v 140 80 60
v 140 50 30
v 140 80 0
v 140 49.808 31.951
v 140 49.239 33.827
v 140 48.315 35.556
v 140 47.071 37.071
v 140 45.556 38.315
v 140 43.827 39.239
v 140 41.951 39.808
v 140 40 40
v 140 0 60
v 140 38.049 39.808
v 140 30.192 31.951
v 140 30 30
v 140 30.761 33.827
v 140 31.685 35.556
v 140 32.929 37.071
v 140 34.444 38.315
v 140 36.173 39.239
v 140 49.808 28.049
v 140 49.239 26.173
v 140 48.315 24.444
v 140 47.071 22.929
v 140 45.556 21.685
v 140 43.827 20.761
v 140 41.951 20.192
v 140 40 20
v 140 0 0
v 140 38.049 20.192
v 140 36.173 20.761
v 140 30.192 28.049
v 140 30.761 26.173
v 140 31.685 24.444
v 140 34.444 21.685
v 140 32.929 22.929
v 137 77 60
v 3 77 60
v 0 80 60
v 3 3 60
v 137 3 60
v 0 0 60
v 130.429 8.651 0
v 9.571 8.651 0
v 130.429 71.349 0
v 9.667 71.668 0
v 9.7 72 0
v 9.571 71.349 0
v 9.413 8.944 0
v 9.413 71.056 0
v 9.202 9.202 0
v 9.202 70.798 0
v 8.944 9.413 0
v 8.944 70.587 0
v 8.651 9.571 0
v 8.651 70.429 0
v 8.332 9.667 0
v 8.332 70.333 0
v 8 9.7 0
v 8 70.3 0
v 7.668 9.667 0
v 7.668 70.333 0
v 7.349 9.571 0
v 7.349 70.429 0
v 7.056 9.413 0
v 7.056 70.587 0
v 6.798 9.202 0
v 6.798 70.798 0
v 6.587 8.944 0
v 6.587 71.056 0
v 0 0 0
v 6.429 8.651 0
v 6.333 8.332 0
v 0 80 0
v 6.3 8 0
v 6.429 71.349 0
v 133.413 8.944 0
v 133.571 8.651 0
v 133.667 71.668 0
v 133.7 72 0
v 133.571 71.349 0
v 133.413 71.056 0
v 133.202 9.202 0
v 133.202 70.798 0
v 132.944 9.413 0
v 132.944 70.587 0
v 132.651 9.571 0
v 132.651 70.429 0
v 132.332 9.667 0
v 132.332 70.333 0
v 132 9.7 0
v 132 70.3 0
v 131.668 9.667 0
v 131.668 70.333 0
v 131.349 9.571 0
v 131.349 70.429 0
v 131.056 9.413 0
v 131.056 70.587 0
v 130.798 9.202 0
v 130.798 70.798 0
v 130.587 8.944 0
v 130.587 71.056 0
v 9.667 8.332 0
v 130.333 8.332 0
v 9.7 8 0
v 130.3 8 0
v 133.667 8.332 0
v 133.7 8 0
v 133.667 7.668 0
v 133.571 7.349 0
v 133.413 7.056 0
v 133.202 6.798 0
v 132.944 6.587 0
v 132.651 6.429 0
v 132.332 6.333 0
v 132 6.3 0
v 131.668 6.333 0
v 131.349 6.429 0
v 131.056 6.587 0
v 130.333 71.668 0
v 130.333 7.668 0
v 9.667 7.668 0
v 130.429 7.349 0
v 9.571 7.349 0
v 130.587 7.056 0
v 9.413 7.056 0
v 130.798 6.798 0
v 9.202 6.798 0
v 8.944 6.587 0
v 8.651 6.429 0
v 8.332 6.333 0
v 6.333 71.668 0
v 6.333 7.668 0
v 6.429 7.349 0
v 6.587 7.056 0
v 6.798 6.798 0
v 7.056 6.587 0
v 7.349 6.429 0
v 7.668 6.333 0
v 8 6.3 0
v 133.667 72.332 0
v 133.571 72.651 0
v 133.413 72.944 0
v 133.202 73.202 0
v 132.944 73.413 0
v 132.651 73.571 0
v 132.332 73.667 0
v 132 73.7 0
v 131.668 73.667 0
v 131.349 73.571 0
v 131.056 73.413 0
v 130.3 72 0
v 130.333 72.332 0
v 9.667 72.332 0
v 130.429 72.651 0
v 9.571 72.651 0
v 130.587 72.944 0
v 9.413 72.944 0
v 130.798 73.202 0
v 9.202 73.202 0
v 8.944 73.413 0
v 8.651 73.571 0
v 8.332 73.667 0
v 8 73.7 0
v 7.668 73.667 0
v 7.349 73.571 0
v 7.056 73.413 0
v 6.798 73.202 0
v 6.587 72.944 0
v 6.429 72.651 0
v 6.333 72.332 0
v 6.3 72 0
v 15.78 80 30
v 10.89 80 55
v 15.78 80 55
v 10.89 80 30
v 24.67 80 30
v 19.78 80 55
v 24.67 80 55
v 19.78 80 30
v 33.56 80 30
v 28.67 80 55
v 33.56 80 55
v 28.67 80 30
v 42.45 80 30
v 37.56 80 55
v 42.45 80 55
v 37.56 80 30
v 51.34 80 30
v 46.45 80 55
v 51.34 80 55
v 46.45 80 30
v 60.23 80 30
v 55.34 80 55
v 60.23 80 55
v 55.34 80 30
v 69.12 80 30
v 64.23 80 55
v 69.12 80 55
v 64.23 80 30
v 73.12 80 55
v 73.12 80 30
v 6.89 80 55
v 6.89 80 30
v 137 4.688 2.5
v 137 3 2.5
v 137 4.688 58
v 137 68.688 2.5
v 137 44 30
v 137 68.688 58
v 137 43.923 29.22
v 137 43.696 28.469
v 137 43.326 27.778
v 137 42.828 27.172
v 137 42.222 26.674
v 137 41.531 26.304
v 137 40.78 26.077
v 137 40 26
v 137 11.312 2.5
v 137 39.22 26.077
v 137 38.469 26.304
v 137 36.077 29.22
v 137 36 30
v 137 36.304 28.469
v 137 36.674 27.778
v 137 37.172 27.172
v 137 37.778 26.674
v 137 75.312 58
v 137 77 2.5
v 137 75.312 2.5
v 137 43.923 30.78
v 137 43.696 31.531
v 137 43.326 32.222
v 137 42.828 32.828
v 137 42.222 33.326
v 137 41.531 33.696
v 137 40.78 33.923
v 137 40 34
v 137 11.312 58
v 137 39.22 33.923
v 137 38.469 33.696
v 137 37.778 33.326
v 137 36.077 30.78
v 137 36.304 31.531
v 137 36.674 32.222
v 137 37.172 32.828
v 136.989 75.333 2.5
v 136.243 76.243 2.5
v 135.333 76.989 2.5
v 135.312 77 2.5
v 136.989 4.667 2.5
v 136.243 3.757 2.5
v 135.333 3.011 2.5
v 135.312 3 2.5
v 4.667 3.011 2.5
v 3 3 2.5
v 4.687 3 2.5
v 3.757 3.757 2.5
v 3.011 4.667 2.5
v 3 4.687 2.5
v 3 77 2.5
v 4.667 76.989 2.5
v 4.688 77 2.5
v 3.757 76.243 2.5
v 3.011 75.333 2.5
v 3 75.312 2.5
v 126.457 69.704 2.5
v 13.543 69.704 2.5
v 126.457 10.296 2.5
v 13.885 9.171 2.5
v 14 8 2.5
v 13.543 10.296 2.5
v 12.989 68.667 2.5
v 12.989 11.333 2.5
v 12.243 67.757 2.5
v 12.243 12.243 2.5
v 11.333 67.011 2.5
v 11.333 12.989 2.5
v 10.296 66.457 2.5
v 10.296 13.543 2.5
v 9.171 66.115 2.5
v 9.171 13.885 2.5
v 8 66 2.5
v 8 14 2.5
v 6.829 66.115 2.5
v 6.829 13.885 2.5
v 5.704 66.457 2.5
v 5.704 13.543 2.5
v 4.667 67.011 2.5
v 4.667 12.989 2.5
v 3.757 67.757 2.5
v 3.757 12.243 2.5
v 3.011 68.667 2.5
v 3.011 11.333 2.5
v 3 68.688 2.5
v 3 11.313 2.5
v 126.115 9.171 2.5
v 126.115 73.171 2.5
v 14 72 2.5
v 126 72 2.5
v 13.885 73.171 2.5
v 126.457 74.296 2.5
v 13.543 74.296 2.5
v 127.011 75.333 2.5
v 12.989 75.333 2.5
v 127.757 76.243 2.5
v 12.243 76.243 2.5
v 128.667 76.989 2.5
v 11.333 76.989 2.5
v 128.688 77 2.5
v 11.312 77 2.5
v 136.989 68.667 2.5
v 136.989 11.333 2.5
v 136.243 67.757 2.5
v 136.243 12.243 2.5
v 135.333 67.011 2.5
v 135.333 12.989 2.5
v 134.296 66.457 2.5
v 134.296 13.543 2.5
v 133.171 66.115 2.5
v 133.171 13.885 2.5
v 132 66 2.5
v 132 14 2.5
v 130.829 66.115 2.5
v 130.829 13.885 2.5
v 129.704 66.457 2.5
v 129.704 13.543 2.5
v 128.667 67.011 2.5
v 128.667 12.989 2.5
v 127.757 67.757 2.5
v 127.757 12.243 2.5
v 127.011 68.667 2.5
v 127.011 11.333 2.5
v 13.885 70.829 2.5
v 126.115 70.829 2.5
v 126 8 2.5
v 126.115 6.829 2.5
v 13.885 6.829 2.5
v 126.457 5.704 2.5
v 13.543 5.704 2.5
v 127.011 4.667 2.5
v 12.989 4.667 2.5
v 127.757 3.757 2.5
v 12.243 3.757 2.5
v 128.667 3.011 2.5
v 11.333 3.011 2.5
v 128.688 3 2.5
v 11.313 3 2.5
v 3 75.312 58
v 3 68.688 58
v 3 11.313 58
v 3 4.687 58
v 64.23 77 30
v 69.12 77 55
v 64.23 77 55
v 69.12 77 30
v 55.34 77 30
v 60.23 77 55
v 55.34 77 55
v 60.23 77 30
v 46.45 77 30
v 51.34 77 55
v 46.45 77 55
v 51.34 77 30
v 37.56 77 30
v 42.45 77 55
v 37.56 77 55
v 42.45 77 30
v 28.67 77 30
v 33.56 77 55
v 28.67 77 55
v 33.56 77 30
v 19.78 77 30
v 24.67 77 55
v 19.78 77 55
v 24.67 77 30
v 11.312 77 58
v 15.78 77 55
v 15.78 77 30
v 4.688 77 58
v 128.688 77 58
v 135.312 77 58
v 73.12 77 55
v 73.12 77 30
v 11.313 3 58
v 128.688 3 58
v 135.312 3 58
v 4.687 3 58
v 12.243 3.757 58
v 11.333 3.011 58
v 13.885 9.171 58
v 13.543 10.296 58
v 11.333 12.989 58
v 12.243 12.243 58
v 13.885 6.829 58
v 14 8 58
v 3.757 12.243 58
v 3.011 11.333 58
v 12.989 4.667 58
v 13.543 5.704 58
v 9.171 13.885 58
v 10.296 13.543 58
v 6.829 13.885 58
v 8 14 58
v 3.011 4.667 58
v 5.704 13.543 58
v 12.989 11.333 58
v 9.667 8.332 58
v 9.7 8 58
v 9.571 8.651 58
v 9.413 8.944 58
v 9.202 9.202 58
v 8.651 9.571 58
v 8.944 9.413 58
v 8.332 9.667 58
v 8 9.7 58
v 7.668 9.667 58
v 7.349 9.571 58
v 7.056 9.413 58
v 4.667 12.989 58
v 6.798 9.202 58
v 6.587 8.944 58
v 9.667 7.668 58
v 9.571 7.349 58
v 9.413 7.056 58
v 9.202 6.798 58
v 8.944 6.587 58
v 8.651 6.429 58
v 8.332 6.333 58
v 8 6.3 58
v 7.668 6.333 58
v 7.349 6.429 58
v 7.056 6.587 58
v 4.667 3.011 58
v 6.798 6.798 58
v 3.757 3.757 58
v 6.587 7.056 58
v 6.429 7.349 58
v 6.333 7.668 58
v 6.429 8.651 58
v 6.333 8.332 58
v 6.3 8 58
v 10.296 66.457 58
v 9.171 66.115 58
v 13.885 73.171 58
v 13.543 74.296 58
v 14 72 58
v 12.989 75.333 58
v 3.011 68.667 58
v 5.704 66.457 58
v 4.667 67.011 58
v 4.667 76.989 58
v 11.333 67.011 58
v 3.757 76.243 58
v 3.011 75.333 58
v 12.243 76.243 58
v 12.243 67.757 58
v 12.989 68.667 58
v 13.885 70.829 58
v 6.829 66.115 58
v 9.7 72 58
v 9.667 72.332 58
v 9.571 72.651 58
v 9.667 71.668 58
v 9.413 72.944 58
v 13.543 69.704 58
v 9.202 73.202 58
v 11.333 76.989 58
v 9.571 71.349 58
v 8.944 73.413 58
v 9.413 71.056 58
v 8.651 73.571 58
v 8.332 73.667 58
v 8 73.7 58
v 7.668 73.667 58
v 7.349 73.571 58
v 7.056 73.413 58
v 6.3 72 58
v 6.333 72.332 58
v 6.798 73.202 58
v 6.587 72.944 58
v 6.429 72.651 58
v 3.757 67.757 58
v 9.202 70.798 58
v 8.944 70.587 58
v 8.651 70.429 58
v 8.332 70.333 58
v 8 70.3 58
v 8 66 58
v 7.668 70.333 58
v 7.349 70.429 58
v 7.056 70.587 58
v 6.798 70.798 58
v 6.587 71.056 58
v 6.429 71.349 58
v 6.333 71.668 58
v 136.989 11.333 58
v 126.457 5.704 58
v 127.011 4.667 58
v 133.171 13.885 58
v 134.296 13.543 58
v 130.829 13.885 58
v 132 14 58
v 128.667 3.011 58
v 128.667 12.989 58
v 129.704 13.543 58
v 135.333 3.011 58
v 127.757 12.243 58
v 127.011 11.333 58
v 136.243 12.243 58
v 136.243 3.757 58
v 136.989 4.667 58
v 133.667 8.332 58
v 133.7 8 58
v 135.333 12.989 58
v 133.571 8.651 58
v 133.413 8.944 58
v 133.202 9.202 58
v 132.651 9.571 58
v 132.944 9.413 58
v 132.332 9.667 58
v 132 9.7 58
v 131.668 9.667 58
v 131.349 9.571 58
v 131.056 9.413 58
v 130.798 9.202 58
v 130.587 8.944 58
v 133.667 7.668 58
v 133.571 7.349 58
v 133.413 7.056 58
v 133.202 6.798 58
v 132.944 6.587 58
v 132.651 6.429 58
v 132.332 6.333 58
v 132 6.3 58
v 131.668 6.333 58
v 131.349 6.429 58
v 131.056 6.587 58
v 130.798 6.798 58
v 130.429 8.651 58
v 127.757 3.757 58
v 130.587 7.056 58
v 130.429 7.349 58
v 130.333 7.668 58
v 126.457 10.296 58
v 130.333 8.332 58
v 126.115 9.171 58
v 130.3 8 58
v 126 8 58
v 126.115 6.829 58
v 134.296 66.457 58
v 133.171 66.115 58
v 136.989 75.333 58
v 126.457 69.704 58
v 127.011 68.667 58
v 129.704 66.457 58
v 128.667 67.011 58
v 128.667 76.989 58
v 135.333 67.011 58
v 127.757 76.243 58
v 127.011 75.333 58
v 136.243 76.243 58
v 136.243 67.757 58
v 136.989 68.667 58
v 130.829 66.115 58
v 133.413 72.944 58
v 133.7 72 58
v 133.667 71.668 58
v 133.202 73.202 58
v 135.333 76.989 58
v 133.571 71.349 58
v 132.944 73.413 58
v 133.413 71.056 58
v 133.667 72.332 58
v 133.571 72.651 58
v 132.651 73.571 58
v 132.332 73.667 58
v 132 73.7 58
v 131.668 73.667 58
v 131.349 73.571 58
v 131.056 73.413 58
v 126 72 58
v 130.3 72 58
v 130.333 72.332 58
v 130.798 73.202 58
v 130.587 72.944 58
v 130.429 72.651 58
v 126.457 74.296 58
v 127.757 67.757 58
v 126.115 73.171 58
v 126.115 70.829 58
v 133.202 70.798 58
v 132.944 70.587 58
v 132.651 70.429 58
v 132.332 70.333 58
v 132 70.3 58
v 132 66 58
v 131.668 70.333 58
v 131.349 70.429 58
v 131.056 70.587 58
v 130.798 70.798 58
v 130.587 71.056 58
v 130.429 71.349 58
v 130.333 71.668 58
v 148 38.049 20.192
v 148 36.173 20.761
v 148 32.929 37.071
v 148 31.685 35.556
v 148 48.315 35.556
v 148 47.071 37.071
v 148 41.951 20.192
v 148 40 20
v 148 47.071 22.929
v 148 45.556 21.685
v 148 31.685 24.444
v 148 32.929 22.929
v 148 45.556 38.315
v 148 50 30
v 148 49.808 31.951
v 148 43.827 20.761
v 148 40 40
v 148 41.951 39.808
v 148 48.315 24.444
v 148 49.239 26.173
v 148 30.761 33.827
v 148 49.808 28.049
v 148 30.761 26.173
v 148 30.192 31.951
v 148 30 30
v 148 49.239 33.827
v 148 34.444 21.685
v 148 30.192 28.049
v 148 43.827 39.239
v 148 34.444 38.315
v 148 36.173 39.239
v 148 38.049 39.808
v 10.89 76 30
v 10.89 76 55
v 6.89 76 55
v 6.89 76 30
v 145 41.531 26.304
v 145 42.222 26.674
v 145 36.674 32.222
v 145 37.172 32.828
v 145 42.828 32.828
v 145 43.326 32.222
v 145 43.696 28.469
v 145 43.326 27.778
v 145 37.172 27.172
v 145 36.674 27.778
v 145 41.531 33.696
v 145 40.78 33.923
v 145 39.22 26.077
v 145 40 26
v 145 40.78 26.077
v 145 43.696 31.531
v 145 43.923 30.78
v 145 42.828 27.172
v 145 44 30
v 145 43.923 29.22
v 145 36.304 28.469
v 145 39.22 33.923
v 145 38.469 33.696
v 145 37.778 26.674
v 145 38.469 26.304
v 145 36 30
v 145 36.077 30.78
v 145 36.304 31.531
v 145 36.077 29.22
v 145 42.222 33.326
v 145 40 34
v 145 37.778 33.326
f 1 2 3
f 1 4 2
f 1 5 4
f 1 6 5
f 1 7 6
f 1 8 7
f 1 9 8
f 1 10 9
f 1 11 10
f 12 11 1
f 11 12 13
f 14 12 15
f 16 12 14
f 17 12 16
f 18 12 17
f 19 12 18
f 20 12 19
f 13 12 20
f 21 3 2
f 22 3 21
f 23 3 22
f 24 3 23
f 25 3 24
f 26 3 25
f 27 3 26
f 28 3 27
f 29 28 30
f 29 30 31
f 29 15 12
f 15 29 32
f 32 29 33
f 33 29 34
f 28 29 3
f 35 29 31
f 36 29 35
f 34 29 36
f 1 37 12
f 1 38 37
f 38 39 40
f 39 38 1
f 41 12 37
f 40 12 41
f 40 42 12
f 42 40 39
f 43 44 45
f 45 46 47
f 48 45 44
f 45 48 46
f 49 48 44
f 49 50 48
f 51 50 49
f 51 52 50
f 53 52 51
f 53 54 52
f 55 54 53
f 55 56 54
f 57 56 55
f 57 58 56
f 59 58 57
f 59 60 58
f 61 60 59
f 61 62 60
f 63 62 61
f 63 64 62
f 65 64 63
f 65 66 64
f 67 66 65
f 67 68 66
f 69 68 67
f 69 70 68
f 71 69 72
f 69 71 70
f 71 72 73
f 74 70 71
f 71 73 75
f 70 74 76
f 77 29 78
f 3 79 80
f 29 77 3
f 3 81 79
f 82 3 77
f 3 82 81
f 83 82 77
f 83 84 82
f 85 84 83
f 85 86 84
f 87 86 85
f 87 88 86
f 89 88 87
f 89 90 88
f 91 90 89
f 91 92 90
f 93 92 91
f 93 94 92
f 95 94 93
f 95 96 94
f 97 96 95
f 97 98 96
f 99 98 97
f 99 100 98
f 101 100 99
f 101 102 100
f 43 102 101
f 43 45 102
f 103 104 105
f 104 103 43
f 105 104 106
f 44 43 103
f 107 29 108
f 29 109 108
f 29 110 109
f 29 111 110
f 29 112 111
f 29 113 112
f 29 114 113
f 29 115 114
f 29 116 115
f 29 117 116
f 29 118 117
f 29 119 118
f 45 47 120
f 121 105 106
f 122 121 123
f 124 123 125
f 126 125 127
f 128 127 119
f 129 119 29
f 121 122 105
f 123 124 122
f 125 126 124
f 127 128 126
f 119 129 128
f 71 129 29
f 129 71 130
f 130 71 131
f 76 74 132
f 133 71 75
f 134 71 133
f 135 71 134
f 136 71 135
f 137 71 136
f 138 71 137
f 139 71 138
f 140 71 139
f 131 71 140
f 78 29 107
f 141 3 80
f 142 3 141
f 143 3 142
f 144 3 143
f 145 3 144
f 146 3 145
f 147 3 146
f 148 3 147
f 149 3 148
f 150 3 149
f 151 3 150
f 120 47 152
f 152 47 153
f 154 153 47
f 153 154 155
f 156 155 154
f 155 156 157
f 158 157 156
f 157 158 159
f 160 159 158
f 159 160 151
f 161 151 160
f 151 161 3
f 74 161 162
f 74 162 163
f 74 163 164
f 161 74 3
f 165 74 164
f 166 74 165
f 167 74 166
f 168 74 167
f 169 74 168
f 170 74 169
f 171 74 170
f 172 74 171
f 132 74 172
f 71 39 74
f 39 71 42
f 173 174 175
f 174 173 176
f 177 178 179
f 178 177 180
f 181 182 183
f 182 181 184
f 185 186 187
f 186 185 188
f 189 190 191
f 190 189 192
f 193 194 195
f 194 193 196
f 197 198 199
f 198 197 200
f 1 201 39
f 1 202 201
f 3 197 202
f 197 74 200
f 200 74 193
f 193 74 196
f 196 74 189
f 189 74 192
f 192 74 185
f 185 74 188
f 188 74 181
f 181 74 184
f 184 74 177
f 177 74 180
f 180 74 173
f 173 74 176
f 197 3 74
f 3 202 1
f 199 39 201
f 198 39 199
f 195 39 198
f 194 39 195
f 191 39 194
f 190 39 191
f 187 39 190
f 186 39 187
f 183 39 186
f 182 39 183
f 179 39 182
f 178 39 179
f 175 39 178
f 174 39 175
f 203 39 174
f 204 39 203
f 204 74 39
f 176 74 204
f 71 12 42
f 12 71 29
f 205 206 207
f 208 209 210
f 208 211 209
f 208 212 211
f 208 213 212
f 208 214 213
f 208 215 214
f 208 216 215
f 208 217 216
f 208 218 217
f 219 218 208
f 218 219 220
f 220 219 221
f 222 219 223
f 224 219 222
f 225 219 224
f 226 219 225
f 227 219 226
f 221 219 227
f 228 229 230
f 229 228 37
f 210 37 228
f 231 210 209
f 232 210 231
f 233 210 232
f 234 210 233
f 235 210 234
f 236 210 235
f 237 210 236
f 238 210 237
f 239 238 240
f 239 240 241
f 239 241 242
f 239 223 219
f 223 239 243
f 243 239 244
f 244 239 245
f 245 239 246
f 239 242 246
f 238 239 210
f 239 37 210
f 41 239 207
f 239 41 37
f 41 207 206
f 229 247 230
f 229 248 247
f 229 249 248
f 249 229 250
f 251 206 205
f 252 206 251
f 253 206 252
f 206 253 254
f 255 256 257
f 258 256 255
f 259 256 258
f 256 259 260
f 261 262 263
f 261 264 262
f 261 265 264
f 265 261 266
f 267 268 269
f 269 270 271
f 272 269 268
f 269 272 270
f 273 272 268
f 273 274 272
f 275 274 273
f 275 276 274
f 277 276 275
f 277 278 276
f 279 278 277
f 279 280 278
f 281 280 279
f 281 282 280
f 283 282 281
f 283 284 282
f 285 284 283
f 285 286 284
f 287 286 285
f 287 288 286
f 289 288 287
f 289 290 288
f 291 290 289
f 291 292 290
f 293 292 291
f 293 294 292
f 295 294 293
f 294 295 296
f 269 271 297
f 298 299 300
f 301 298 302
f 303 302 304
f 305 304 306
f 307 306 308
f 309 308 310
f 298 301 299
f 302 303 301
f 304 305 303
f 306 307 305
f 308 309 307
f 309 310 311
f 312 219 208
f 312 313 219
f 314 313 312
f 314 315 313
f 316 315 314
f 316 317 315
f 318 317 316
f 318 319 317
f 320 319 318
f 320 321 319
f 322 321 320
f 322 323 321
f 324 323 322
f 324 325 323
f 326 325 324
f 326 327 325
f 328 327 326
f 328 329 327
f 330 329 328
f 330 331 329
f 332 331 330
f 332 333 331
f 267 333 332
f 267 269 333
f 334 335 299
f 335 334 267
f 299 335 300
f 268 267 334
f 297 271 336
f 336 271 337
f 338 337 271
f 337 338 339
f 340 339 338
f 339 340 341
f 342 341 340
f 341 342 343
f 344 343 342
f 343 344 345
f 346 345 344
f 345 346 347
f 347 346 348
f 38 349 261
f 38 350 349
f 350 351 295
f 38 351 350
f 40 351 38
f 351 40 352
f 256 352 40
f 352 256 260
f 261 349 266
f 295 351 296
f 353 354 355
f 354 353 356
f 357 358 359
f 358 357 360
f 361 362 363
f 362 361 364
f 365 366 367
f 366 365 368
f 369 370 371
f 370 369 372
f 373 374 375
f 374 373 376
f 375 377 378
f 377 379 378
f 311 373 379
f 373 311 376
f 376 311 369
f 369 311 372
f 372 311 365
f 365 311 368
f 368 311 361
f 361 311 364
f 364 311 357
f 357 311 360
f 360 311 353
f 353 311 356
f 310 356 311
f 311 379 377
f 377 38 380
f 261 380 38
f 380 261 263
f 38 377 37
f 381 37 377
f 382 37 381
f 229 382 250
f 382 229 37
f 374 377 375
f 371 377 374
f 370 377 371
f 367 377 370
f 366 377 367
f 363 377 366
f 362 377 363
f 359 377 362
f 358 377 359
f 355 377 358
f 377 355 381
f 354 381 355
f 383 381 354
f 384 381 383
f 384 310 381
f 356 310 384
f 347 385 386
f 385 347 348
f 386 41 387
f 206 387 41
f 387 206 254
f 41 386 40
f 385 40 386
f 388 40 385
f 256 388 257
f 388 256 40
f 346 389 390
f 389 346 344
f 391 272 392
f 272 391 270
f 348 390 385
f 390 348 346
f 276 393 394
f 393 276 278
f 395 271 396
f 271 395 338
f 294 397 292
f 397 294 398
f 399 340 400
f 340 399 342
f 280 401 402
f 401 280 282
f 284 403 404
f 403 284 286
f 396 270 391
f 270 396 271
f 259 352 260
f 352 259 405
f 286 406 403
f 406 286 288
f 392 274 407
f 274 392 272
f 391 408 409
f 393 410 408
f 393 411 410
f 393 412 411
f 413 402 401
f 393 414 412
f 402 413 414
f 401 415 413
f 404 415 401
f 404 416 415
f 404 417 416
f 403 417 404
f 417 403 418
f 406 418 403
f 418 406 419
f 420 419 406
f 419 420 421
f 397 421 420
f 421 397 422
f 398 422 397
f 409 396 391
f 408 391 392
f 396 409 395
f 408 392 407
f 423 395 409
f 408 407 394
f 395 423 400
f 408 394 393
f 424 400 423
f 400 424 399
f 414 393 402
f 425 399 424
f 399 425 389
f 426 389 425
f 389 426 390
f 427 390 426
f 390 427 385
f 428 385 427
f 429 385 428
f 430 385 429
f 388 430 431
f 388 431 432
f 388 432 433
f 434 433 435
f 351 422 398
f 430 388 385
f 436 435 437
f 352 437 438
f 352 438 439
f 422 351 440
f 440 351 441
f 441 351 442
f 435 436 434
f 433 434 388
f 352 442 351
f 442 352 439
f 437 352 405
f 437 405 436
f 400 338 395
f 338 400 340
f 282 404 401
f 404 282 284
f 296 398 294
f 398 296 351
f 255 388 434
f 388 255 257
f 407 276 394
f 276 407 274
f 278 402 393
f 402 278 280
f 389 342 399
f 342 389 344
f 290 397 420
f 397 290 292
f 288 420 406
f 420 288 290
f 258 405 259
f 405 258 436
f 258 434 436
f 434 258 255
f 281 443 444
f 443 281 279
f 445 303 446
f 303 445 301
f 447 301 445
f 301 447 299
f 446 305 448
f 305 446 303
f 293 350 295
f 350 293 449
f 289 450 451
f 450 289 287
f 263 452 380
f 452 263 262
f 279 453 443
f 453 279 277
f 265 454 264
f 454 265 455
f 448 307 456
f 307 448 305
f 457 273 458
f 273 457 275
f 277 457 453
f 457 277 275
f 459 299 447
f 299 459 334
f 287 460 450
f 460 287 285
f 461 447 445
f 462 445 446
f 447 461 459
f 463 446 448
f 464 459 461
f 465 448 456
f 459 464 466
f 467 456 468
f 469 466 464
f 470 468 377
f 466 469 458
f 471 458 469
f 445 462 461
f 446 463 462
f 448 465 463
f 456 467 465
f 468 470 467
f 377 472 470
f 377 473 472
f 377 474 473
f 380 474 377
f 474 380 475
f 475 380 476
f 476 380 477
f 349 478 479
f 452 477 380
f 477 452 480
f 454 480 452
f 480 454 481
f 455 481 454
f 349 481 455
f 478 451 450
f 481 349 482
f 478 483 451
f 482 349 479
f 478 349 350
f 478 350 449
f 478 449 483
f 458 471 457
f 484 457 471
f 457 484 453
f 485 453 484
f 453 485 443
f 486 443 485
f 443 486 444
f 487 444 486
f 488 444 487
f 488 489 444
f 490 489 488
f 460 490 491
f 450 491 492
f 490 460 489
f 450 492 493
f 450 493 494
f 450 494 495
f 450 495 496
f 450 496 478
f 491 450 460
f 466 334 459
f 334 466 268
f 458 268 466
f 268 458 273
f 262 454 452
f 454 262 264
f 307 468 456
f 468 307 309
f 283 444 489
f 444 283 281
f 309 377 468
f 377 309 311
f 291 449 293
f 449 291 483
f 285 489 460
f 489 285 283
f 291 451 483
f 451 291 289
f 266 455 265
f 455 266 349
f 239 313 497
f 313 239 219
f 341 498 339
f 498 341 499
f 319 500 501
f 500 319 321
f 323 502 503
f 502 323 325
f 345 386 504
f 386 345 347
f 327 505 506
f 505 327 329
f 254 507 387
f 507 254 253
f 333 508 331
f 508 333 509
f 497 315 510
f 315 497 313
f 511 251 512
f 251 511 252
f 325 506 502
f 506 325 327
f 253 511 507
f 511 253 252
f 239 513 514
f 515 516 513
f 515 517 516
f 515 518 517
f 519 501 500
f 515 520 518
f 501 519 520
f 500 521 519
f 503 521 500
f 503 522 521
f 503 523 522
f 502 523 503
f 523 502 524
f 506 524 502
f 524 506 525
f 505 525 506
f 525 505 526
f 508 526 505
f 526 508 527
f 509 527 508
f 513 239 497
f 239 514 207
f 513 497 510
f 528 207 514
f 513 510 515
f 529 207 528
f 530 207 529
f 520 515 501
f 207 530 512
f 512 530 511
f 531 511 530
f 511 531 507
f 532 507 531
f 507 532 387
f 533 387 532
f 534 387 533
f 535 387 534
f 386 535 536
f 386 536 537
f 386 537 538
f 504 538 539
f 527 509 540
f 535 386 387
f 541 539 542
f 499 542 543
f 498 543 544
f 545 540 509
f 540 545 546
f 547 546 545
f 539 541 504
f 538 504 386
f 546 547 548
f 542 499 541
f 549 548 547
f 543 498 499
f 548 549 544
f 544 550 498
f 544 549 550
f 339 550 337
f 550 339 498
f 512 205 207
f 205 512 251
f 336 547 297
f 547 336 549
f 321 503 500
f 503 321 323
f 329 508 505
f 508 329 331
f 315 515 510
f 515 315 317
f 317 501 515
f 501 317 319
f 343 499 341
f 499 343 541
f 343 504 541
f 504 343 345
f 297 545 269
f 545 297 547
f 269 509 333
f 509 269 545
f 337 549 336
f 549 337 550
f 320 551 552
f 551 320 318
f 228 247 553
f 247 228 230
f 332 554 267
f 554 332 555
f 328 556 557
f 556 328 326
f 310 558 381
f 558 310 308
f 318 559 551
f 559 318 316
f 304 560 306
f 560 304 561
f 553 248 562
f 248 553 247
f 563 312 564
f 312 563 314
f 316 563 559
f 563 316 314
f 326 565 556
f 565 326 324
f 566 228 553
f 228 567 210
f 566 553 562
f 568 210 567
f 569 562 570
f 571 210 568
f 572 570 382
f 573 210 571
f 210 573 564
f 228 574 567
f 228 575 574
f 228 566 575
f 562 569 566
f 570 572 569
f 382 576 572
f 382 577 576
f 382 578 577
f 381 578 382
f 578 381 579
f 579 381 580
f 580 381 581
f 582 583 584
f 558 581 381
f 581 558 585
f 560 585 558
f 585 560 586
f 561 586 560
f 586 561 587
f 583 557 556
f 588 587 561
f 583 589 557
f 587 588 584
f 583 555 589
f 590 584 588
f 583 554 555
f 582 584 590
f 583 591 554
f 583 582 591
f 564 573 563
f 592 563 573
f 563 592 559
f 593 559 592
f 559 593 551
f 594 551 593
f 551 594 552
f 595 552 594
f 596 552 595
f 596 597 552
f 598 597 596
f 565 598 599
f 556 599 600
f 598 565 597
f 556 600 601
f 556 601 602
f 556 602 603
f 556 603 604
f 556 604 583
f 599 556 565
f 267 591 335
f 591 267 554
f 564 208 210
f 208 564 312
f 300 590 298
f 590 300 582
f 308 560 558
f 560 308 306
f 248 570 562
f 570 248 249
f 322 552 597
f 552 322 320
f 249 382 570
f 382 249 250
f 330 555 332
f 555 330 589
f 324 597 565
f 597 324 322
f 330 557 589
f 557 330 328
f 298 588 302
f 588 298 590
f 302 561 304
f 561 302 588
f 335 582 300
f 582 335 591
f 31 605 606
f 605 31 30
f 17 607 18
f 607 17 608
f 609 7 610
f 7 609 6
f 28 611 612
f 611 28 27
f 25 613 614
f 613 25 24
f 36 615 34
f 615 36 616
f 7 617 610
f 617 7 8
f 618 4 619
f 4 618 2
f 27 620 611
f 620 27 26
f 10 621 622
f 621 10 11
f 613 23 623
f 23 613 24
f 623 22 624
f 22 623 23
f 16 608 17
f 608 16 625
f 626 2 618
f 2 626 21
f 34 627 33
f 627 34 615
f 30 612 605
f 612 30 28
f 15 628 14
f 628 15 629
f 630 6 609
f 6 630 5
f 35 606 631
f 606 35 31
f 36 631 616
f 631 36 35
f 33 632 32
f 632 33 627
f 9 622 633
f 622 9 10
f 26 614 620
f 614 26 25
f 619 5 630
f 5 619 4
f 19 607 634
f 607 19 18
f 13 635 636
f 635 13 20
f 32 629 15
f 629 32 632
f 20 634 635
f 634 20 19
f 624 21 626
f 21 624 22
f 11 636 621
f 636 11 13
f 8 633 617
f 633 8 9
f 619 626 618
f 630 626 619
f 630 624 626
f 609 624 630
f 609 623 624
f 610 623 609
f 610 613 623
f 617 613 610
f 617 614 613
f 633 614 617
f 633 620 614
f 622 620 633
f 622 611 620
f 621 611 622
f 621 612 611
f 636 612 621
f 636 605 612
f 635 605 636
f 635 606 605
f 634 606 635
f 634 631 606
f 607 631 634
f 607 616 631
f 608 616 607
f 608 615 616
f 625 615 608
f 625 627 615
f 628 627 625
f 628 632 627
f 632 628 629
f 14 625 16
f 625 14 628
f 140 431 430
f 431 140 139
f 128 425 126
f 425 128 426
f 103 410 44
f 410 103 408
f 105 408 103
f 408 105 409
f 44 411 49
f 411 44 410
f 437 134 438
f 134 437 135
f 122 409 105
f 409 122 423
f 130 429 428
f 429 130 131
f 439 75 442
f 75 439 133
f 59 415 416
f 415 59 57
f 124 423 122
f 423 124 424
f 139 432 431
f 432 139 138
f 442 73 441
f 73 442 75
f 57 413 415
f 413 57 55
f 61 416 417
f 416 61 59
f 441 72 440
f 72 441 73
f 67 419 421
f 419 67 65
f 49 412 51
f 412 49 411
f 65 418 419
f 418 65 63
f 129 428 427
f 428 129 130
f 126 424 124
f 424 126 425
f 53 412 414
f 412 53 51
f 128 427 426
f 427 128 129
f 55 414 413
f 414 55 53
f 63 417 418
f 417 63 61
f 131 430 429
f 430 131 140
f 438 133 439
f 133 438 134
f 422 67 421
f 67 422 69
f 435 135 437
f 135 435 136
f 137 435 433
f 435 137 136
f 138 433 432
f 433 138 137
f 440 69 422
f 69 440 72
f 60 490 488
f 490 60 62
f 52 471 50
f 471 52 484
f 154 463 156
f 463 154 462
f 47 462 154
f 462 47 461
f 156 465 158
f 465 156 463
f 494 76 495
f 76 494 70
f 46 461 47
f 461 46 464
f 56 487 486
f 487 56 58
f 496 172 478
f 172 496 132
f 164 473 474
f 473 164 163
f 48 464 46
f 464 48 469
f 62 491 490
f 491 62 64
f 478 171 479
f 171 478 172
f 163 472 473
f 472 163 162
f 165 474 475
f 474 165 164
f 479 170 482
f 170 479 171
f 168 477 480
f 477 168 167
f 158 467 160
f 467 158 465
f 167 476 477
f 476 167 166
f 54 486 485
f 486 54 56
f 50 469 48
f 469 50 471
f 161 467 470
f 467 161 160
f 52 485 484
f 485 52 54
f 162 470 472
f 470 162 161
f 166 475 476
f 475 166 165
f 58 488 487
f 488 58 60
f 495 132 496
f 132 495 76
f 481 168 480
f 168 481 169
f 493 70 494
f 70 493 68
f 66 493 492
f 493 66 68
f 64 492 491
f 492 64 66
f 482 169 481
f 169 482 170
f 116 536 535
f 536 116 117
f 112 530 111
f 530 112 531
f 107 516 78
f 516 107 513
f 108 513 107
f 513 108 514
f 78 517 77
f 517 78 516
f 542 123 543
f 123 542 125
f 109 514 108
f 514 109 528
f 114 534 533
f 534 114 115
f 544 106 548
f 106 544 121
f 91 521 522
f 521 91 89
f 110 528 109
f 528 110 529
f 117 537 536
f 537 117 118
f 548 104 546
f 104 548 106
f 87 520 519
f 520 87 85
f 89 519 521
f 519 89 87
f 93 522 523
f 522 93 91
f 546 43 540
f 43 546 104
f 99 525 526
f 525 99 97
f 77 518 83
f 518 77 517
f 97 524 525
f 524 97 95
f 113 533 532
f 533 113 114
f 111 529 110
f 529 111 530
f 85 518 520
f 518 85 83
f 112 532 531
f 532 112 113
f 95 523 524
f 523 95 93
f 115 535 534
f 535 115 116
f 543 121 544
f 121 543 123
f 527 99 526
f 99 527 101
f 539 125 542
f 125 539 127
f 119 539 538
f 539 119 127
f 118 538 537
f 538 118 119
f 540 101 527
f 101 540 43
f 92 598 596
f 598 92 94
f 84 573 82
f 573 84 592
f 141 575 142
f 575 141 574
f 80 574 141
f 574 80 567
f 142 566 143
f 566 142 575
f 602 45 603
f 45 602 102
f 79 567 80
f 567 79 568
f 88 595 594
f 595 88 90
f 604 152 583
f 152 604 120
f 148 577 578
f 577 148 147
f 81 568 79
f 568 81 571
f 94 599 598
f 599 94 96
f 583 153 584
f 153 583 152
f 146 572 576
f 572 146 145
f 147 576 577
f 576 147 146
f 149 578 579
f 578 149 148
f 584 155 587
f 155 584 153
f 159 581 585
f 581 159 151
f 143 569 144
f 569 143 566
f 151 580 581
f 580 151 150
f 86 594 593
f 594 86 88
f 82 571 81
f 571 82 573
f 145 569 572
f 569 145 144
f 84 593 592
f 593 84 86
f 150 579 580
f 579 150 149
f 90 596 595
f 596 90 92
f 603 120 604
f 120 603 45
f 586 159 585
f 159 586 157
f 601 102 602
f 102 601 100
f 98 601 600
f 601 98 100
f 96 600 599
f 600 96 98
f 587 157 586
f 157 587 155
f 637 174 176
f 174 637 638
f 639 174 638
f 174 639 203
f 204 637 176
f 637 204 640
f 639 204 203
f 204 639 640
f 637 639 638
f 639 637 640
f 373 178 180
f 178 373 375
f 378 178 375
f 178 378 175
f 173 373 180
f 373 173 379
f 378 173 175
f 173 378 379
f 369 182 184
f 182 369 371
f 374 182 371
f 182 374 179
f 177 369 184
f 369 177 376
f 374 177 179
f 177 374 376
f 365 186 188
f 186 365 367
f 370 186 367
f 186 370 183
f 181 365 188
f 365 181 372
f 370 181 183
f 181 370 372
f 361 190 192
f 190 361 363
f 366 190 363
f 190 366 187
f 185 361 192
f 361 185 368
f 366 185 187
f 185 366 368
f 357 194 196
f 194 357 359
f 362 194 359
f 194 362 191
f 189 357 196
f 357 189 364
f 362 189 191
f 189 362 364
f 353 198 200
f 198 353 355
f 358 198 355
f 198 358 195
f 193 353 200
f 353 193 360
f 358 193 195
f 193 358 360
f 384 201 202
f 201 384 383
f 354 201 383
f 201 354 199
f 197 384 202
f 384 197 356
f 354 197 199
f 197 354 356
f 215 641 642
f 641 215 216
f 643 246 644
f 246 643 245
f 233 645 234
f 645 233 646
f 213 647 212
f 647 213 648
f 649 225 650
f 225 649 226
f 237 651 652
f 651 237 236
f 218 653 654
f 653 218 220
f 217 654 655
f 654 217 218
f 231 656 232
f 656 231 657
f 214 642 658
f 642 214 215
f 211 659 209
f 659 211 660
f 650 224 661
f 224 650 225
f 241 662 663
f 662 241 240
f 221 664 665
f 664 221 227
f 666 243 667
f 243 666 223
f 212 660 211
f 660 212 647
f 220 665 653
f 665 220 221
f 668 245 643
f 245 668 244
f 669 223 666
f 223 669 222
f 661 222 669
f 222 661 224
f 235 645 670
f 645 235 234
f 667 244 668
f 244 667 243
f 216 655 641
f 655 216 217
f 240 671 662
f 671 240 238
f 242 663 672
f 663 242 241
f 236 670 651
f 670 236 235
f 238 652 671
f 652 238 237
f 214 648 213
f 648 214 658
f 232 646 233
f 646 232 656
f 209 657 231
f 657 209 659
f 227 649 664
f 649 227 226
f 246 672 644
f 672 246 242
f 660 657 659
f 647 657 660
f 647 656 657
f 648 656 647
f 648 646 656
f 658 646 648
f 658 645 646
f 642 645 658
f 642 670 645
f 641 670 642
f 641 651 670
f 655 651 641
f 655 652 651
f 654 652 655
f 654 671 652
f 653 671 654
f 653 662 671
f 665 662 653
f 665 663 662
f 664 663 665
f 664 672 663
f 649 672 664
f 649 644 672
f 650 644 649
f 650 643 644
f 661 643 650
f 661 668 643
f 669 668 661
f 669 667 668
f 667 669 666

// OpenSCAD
$fn = 32;

// ----------------------------------------------------------------------
// Enclosure body: 140 x 80 x 60 mm, wall 3 mm
// ----------------------------------------------------------------------

// --- parameters (mm) ---
length = 140;             // outside length, X
width = 80;               // outside width, Y
height = 60;              // outside height, Z
wall = 3;                 // side wall thickness
floor_t = 2.5;            // floor thickness
boss_d = 12;              // corner boss diameter
boss_h = 55.5;            // corner boss height above the floor
boss_hole_d = 3.4;        // lid screw clearance in the boss
boss_lip = 8;             // boss centre inset from the corner
vent_slots = 8;           // vent slots in the long wall
vent_w = 4;               // vent slot width
vent_h = 25;              // vent slot height
vent_pitch = 8.89;        // vent slot pitch
vent_z = 30;              // vent slot sill height
nipple_d = 20;            // cable gland boss diameter
nipple_h = 8;             // cable gland boss height
nipple_bore = 8;          // cable gland bore

module shell() {
  difference() {
    cube([length, width, height]);
    /* hollow, open at the top */
    translate([wall, wall, floor_t])
      cube([length - 2 * wall, width - 2 * wall, height]);
  }
}

module bosses() {
  /* corner bosses, sunk 1 mm into the floor */
  for (sx = [0, 1]) for (sy = [0, 1])
    translate([sx * (length - 2 * boss_lip) + boss_lip, sy * (width - 2 * boss_lip) + boss_lip, floor_t - 1])
      cylinder(h = boss_h + 1, d = boss_d);
}

module gland() {
  /* boss on the short wall, sunk 1 mm into it */
  translate([length - 1, width / 2, height * 0.5]) rotate([0, 90, 0])
    cylinder(h = nipple_h + 1, d = nipple_d);
}

difference() {
  union() {
    shell();
    bosses();
    gland();
  }
  /* boss screw holes */
  for (sx = [0, 1]) for (sy = [0, 1])
    translate([sx * (length - 2 * boss_lip) + boss_lip, sy * (width - 2 * boss_lip) + boss_lip, -1]) cylinder(h = floor_t + boss_h + 2, d = boss_hole_d);
  /* vent grille in the +Y wall */
  for (i = [0 : vent_slots - 1]) translate([vent_pitch * (i + 1) - vent_w / 2, width - wall - 1, vent_z]) cube([vent_w, wall + 2, vent_h]);
  translate([length, width / 2, height * 0.5]) rotate([0, 90, 0]) translate([0, 0, -nipple_h - 2]) cylinder(h = nipple_h + wall + 4, d = nipple_bore);
}
